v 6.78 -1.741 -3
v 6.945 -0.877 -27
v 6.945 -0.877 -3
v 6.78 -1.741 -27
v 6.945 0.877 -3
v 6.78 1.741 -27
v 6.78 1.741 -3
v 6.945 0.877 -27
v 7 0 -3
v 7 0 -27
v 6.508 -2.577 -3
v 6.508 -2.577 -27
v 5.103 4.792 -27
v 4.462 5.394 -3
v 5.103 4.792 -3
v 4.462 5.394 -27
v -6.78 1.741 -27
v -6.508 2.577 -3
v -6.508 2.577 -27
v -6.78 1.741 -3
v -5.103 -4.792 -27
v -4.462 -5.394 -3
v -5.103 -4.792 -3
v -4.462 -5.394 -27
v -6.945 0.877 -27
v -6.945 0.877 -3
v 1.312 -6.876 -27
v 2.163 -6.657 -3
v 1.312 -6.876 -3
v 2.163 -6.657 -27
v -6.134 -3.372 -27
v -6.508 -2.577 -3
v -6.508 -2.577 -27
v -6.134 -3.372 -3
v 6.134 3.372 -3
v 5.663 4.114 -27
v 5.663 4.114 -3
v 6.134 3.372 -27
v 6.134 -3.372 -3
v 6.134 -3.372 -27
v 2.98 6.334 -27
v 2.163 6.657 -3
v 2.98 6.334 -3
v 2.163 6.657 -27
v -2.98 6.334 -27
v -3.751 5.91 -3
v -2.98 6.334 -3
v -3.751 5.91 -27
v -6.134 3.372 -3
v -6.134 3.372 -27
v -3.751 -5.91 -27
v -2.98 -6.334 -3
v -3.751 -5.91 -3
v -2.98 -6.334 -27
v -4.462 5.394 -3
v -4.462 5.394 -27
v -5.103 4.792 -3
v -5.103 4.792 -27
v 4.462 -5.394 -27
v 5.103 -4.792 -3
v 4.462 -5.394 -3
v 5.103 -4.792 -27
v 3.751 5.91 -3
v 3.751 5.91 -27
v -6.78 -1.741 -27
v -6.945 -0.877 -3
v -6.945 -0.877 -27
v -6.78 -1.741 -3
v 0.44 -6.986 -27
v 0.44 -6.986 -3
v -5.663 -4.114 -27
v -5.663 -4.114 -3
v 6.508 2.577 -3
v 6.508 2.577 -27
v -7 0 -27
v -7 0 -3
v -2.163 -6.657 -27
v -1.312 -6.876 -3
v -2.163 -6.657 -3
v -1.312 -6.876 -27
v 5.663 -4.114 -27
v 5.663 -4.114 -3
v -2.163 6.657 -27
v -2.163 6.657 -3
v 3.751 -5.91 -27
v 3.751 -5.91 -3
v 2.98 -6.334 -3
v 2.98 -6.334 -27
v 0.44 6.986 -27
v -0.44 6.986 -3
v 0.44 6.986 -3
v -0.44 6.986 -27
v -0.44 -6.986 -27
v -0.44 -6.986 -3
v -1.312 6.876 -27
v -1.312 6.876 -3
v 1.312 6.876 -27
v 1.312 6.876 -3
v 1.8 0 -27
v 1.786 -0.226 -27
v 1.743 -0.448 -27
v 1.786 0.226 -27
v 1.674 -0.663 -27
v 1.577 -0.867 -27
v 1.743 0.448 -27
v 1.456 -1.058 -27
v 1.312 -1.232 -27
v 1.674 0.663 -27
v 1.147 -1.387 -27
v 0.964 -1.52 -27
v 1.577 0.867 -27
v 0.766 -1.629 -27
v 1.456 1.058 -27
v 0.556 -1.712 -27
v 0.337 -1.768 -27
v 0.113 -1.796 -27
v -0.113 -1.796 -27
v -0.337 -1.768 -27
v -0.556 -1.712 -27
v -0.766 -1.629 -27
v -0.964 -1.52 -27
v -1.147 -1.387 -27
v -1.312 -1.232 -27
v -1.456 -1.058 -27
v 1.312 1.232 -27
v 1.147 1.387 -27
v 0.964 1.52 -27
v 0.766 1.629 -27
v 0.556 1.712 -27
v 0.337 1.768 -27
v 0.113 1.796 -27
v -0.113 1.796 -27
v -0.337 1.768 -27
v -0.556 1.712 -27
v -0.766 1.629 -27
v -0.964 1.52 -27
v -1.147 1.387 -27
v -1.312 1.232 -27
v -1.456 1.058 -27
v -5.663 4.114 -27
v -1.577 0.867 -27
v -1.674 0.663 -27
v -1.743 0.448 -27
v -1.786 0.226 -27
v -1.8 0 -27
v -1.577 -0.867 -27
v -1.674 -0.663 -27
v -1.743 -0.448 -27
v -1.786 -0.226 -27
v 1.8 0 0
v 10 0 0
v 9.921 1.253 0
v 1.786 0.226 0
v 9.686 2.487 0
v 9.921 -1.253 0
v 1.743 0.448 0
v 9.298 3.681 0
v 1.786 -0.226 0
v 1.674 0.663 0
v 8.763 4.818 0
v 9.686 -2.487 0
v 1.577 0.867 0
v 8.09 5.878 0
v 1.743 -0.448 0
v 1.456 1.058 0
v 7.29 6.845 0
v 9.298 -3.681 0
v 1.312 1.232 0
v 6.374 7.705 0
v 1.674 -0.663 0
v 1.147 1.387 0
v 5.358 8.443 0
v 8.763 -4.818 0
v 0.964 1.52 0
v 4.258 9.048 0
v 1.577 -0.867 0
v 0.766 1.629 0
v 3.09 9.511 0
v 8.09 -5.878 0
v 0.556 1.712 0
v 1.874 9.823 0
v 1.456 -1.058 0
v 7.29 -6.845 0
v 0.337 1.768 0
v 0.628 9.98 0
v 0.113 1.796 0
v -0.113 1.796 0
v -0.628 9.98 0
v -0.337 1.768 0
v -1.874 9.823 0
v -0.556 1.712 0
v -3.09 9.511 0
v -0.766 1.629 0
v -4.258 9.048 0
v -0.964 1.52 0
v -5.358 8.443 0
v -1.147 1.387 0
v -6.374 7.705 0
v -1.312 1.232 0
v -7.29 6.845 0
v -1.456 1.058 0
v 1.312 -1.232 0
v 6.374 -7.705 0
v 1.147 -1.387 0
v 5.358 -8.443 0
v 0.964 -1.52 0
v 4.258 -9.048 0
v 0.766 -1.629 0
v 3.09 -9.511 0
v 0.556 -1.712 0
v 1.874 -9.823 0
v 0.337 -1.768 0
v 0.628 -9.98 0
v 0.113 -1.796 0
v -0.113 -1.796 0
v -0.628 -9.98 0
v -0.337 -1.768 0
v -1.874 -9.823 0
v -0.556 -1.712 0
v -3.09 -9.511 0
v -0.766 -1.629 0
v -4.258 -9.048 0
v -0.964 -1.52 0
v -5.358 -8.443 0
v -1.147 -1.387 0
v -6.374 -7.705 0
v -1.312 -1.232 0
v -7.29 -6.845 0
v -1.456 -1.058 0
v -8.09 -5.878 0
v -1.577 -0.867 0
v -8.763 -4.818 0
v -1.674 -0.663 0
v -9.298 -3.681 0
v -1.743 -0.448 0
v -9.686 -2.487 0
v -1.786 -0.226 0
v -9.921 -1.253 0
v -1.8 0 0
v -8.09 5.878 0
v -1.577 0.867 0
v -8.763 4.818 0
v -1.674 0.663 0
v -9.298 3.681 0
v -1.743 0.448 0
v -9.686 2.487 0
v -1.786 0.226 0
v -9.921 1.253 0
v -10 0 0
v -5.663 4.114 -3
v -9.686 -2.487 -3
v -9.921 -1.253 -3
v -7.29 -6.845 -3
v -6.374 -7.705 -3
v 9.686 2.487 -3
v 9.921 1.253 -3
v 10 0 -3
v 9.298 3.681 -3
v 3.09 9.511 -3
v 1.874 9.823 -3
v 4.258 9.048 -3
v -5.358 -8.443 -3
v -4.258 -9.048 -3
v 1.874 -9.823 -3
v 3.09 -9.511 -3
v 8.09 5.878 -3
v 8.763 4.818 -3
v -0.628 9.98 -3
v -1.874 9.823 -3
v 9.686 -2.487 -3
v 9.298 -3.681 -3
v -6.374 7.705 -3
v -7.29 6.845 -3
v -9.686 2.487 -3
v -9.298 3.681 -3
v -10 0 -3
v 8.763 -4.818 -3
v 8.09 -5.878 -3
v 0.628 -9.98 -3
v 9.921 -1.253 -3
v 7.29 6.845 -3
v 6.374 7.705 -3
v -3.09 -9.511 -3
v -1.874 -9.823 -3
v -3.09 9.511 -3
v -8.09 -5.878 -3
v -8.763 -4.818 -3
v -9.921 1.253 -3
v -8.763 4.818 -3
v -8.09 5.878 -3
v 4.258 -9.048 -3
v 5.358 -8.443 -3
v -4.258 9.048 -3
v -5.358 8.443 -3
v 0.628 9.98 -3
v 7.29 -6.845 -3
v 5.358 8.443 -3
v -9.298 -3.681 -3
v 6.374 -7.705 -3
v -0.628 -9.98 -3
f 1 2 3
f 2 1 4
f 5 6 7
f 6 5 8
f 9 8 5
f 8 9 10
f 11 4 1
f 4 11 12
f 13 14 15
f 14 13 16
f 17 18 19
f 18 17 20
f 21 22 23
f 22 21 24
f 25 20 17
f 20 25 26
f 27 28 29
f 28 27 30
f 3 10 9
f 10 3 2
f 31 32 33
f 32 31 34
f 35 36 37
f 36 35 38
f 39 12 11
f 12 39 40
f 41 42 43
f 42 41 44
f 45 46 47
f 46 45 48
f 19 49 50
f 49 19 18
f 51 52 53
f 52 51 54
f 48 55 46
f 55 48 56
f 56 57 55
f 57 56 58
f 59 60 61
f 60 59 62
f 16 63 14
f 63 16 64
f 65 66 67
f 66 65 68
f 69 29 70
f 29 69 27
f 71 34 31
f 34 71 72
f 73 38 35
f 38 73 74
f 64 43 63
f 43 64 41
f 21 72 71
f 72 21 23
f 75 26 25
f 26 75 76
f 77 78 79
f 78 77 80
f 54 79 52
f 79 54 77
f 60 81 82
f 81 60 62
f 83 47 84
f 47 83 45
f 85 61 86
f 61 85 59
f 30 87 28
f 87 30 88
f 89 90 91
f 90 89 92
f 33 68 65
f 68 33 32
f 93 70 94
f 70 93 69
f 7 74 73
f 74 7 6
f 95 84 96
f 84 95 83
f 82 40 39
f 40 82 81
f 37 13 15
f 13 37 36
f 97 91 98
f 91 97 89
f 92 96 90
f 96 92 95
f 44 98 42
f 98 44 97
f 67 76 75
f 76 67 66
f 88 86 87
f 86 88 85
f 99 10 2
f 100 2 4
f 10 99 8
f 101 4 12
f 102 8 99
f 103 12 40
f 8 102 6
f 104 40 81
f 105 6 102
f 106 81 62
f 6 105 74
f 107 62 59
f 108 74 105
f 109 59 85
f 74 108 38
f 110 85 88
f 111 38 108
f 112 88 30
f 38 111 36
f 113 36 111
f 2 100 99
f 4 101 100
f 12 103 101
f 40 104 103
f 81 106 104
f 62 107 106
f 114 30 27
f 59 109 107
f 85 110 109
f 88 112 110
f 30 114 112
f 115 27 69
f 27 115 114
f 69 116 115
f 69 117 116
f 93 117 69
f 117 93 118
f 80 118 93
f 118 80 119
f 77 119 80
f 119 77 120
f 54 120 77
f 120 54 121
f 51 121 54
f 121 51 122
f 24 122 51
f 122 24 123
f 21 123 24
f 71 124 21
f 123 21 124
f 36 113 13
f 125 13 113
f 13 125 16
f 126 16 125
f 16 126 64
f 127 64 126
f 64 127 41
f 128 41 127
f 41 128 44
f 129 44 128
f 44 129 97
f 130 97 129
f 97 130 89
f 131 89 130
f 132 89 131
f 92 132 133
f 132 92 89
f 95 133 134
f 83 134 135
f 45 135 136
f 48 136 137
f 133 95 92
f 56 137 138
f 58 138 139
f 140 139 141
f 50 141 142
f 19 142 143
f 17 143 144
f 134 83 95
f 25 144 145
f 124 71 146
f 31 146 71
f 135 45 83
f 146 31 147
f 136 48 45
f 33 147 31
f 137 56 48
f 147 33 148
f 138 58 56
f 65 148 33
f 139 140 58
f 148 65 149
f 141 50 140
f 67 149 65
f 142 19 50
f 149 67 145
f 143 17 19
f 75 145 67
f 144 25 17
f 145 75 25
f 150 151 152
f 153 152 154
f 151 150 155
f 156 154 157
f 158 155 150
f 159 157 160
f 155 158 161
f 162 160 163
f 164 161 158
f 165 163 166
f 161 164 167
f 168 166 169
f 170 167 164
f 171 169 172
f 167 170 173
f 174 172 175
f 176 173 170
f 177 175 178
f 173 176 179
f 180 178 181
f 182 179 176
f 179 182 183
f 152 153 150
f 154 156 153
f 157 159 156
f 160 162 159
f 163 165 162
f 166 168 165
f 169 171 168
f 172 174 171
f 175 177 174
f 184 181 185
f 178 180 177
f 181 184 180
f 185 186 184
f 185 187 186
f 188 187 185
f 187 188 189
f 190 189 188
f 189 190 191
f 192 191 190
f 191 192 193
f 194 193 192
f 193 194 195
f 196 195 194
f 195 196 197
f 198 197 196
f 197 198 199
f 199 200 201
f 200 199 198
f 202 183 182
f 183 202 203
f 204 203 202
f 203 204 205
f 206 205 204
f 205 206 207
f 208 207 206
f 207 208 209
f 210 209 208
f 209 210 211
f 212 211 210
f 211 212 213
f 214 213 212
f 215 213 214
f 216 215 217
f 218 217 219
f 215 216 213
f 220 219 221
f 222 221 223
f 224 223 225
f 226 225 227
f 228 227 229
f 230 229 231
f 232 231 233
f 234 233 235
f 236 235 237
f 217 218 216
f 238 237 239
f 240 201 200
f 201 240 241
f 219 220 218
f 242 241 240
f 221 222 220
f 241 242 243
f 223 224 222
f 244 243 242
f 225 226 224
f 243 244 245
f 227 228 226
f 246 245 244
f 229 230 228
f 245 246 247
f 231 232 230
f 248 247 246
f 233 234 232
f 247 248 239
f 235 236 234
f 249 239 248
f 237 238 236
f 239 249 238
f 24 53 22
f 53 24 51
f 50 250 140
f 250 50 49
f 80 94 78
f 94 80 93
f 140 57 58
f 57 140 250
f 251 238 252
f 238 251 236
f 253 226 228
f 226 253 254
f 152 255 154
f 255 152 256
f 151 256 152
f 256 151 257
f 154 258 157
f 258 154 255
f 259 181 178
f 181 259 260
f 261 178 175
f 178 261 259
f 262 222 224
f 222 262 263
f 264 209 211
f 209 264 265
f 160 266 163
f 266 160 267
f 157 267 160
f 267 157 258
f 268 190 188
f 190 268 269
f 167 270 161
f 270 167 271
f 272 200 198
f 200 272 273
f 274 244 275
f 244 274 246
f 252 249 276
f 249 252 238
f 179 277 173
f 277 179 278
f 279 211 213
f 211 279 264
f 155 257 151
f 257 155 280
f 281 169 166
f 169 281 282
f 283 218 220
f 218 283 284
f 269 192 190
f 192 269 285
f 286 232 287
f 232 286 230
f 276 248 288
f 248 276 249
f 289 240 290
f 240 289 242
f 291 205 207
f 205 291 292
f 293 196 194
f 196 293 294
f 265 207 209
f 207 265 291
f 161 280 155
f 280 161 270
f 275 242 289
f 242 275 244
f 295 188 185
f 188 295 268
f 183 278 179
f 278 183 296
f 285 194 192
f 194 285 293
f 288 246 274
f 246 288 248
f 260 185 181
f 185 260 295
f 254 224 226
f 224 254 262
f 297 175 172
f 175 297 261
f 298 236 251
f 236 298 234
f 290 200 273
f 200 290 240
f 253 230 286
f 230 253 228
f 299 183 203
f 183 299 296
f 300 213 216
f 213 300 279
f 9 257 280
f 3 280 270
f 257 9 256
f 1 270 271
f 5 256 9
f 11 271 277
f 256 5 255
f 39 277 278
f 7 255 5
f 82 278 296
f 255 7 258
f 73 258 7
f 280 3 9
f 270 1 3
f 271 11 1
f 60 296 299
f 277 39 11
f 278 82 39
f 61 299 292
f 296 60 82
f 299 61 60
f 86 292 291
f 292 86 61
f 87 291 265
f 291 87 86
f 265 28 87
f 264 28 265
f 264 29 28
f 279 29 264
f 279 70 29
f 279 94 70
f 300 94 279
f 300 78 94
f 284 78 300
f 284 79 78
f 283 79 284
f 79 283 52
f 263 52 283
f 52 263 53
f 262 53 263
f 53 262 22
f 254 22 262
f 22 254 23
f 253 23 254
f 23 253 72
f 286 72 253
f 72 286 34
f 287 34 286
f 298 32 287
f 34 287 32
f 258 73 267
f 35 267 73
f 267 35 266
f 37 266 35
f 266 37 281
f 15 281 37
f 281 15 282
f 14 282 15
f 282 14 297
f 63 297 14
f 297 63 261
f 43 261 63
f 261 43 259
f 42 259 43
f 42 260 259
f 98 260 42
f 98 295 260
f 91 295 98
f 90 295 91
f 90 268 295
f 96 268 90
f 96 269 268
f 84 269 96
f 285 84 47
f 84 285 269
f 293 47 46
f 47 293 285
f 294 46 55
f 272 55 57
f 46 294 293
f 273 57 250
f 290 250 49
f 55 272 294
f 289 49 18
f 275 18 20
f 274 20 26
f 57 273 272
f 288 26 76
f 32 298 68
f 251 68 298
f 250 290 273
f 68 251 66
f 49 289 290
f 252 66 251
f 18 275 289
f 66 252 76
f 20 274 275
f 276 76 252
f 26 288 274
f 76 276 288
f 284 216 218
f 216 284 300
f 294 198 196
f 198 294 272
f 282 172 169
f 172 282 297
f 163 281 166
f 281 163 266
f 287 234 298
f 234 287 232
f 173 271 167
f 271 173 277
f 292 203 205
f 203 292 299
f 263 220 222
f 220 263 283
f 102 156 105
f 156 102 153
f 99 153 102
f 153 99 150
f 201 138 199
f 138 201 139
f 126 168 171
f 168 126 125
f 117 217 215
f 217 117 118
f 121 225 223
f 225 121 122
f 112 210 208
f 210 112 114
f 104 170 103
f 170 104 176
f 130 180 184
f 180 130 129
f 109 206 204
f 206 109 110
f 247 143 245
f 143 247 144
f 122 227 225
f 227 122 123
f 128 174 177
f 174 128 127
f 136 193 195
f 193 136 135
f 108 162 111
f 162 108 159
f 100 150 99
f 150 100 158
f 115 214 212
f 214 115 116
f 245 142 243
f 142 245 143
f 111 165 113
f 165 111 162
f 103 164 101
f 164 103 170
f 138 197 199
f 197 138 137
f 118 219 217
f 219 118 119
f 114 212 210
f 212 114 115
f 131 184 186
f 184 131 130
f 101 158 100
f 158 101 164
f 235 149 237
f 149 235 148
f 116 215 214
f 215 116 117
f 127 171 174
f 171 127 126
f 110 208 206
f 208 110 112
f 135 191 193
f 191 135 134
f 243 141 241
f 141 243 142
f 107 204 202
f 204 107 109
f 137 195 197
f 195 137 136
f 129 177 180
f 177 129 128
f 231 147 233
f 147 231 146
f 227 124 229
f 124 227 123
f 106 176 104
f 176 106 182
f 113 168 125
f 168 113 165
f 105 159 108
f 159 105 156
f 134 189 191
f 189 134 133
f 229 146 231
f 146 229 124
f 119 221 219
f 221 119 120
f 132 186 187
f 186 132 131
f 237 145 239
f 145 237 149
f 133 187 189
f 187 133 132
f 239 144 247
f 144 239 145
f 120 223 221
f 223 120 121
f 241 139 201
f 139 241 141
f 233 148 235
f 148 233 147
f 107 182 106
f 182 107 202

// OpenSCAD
$fn = 50;


difference() {
	union() {
		translate(v = [0, 0, -27.0000000000]) {
			cylinder(h = 27, r = 7.0000000000);
		}
		translate(v = [0, 0, -3.0000000000]) {
			cylinder(h = 3, r = 10.0000000000);
		}
	}
	union() {
		#translate(v = [0, 0, -27]) {
			cylinder(h = 27, r = 1.8000000000);
		}
	}
}
